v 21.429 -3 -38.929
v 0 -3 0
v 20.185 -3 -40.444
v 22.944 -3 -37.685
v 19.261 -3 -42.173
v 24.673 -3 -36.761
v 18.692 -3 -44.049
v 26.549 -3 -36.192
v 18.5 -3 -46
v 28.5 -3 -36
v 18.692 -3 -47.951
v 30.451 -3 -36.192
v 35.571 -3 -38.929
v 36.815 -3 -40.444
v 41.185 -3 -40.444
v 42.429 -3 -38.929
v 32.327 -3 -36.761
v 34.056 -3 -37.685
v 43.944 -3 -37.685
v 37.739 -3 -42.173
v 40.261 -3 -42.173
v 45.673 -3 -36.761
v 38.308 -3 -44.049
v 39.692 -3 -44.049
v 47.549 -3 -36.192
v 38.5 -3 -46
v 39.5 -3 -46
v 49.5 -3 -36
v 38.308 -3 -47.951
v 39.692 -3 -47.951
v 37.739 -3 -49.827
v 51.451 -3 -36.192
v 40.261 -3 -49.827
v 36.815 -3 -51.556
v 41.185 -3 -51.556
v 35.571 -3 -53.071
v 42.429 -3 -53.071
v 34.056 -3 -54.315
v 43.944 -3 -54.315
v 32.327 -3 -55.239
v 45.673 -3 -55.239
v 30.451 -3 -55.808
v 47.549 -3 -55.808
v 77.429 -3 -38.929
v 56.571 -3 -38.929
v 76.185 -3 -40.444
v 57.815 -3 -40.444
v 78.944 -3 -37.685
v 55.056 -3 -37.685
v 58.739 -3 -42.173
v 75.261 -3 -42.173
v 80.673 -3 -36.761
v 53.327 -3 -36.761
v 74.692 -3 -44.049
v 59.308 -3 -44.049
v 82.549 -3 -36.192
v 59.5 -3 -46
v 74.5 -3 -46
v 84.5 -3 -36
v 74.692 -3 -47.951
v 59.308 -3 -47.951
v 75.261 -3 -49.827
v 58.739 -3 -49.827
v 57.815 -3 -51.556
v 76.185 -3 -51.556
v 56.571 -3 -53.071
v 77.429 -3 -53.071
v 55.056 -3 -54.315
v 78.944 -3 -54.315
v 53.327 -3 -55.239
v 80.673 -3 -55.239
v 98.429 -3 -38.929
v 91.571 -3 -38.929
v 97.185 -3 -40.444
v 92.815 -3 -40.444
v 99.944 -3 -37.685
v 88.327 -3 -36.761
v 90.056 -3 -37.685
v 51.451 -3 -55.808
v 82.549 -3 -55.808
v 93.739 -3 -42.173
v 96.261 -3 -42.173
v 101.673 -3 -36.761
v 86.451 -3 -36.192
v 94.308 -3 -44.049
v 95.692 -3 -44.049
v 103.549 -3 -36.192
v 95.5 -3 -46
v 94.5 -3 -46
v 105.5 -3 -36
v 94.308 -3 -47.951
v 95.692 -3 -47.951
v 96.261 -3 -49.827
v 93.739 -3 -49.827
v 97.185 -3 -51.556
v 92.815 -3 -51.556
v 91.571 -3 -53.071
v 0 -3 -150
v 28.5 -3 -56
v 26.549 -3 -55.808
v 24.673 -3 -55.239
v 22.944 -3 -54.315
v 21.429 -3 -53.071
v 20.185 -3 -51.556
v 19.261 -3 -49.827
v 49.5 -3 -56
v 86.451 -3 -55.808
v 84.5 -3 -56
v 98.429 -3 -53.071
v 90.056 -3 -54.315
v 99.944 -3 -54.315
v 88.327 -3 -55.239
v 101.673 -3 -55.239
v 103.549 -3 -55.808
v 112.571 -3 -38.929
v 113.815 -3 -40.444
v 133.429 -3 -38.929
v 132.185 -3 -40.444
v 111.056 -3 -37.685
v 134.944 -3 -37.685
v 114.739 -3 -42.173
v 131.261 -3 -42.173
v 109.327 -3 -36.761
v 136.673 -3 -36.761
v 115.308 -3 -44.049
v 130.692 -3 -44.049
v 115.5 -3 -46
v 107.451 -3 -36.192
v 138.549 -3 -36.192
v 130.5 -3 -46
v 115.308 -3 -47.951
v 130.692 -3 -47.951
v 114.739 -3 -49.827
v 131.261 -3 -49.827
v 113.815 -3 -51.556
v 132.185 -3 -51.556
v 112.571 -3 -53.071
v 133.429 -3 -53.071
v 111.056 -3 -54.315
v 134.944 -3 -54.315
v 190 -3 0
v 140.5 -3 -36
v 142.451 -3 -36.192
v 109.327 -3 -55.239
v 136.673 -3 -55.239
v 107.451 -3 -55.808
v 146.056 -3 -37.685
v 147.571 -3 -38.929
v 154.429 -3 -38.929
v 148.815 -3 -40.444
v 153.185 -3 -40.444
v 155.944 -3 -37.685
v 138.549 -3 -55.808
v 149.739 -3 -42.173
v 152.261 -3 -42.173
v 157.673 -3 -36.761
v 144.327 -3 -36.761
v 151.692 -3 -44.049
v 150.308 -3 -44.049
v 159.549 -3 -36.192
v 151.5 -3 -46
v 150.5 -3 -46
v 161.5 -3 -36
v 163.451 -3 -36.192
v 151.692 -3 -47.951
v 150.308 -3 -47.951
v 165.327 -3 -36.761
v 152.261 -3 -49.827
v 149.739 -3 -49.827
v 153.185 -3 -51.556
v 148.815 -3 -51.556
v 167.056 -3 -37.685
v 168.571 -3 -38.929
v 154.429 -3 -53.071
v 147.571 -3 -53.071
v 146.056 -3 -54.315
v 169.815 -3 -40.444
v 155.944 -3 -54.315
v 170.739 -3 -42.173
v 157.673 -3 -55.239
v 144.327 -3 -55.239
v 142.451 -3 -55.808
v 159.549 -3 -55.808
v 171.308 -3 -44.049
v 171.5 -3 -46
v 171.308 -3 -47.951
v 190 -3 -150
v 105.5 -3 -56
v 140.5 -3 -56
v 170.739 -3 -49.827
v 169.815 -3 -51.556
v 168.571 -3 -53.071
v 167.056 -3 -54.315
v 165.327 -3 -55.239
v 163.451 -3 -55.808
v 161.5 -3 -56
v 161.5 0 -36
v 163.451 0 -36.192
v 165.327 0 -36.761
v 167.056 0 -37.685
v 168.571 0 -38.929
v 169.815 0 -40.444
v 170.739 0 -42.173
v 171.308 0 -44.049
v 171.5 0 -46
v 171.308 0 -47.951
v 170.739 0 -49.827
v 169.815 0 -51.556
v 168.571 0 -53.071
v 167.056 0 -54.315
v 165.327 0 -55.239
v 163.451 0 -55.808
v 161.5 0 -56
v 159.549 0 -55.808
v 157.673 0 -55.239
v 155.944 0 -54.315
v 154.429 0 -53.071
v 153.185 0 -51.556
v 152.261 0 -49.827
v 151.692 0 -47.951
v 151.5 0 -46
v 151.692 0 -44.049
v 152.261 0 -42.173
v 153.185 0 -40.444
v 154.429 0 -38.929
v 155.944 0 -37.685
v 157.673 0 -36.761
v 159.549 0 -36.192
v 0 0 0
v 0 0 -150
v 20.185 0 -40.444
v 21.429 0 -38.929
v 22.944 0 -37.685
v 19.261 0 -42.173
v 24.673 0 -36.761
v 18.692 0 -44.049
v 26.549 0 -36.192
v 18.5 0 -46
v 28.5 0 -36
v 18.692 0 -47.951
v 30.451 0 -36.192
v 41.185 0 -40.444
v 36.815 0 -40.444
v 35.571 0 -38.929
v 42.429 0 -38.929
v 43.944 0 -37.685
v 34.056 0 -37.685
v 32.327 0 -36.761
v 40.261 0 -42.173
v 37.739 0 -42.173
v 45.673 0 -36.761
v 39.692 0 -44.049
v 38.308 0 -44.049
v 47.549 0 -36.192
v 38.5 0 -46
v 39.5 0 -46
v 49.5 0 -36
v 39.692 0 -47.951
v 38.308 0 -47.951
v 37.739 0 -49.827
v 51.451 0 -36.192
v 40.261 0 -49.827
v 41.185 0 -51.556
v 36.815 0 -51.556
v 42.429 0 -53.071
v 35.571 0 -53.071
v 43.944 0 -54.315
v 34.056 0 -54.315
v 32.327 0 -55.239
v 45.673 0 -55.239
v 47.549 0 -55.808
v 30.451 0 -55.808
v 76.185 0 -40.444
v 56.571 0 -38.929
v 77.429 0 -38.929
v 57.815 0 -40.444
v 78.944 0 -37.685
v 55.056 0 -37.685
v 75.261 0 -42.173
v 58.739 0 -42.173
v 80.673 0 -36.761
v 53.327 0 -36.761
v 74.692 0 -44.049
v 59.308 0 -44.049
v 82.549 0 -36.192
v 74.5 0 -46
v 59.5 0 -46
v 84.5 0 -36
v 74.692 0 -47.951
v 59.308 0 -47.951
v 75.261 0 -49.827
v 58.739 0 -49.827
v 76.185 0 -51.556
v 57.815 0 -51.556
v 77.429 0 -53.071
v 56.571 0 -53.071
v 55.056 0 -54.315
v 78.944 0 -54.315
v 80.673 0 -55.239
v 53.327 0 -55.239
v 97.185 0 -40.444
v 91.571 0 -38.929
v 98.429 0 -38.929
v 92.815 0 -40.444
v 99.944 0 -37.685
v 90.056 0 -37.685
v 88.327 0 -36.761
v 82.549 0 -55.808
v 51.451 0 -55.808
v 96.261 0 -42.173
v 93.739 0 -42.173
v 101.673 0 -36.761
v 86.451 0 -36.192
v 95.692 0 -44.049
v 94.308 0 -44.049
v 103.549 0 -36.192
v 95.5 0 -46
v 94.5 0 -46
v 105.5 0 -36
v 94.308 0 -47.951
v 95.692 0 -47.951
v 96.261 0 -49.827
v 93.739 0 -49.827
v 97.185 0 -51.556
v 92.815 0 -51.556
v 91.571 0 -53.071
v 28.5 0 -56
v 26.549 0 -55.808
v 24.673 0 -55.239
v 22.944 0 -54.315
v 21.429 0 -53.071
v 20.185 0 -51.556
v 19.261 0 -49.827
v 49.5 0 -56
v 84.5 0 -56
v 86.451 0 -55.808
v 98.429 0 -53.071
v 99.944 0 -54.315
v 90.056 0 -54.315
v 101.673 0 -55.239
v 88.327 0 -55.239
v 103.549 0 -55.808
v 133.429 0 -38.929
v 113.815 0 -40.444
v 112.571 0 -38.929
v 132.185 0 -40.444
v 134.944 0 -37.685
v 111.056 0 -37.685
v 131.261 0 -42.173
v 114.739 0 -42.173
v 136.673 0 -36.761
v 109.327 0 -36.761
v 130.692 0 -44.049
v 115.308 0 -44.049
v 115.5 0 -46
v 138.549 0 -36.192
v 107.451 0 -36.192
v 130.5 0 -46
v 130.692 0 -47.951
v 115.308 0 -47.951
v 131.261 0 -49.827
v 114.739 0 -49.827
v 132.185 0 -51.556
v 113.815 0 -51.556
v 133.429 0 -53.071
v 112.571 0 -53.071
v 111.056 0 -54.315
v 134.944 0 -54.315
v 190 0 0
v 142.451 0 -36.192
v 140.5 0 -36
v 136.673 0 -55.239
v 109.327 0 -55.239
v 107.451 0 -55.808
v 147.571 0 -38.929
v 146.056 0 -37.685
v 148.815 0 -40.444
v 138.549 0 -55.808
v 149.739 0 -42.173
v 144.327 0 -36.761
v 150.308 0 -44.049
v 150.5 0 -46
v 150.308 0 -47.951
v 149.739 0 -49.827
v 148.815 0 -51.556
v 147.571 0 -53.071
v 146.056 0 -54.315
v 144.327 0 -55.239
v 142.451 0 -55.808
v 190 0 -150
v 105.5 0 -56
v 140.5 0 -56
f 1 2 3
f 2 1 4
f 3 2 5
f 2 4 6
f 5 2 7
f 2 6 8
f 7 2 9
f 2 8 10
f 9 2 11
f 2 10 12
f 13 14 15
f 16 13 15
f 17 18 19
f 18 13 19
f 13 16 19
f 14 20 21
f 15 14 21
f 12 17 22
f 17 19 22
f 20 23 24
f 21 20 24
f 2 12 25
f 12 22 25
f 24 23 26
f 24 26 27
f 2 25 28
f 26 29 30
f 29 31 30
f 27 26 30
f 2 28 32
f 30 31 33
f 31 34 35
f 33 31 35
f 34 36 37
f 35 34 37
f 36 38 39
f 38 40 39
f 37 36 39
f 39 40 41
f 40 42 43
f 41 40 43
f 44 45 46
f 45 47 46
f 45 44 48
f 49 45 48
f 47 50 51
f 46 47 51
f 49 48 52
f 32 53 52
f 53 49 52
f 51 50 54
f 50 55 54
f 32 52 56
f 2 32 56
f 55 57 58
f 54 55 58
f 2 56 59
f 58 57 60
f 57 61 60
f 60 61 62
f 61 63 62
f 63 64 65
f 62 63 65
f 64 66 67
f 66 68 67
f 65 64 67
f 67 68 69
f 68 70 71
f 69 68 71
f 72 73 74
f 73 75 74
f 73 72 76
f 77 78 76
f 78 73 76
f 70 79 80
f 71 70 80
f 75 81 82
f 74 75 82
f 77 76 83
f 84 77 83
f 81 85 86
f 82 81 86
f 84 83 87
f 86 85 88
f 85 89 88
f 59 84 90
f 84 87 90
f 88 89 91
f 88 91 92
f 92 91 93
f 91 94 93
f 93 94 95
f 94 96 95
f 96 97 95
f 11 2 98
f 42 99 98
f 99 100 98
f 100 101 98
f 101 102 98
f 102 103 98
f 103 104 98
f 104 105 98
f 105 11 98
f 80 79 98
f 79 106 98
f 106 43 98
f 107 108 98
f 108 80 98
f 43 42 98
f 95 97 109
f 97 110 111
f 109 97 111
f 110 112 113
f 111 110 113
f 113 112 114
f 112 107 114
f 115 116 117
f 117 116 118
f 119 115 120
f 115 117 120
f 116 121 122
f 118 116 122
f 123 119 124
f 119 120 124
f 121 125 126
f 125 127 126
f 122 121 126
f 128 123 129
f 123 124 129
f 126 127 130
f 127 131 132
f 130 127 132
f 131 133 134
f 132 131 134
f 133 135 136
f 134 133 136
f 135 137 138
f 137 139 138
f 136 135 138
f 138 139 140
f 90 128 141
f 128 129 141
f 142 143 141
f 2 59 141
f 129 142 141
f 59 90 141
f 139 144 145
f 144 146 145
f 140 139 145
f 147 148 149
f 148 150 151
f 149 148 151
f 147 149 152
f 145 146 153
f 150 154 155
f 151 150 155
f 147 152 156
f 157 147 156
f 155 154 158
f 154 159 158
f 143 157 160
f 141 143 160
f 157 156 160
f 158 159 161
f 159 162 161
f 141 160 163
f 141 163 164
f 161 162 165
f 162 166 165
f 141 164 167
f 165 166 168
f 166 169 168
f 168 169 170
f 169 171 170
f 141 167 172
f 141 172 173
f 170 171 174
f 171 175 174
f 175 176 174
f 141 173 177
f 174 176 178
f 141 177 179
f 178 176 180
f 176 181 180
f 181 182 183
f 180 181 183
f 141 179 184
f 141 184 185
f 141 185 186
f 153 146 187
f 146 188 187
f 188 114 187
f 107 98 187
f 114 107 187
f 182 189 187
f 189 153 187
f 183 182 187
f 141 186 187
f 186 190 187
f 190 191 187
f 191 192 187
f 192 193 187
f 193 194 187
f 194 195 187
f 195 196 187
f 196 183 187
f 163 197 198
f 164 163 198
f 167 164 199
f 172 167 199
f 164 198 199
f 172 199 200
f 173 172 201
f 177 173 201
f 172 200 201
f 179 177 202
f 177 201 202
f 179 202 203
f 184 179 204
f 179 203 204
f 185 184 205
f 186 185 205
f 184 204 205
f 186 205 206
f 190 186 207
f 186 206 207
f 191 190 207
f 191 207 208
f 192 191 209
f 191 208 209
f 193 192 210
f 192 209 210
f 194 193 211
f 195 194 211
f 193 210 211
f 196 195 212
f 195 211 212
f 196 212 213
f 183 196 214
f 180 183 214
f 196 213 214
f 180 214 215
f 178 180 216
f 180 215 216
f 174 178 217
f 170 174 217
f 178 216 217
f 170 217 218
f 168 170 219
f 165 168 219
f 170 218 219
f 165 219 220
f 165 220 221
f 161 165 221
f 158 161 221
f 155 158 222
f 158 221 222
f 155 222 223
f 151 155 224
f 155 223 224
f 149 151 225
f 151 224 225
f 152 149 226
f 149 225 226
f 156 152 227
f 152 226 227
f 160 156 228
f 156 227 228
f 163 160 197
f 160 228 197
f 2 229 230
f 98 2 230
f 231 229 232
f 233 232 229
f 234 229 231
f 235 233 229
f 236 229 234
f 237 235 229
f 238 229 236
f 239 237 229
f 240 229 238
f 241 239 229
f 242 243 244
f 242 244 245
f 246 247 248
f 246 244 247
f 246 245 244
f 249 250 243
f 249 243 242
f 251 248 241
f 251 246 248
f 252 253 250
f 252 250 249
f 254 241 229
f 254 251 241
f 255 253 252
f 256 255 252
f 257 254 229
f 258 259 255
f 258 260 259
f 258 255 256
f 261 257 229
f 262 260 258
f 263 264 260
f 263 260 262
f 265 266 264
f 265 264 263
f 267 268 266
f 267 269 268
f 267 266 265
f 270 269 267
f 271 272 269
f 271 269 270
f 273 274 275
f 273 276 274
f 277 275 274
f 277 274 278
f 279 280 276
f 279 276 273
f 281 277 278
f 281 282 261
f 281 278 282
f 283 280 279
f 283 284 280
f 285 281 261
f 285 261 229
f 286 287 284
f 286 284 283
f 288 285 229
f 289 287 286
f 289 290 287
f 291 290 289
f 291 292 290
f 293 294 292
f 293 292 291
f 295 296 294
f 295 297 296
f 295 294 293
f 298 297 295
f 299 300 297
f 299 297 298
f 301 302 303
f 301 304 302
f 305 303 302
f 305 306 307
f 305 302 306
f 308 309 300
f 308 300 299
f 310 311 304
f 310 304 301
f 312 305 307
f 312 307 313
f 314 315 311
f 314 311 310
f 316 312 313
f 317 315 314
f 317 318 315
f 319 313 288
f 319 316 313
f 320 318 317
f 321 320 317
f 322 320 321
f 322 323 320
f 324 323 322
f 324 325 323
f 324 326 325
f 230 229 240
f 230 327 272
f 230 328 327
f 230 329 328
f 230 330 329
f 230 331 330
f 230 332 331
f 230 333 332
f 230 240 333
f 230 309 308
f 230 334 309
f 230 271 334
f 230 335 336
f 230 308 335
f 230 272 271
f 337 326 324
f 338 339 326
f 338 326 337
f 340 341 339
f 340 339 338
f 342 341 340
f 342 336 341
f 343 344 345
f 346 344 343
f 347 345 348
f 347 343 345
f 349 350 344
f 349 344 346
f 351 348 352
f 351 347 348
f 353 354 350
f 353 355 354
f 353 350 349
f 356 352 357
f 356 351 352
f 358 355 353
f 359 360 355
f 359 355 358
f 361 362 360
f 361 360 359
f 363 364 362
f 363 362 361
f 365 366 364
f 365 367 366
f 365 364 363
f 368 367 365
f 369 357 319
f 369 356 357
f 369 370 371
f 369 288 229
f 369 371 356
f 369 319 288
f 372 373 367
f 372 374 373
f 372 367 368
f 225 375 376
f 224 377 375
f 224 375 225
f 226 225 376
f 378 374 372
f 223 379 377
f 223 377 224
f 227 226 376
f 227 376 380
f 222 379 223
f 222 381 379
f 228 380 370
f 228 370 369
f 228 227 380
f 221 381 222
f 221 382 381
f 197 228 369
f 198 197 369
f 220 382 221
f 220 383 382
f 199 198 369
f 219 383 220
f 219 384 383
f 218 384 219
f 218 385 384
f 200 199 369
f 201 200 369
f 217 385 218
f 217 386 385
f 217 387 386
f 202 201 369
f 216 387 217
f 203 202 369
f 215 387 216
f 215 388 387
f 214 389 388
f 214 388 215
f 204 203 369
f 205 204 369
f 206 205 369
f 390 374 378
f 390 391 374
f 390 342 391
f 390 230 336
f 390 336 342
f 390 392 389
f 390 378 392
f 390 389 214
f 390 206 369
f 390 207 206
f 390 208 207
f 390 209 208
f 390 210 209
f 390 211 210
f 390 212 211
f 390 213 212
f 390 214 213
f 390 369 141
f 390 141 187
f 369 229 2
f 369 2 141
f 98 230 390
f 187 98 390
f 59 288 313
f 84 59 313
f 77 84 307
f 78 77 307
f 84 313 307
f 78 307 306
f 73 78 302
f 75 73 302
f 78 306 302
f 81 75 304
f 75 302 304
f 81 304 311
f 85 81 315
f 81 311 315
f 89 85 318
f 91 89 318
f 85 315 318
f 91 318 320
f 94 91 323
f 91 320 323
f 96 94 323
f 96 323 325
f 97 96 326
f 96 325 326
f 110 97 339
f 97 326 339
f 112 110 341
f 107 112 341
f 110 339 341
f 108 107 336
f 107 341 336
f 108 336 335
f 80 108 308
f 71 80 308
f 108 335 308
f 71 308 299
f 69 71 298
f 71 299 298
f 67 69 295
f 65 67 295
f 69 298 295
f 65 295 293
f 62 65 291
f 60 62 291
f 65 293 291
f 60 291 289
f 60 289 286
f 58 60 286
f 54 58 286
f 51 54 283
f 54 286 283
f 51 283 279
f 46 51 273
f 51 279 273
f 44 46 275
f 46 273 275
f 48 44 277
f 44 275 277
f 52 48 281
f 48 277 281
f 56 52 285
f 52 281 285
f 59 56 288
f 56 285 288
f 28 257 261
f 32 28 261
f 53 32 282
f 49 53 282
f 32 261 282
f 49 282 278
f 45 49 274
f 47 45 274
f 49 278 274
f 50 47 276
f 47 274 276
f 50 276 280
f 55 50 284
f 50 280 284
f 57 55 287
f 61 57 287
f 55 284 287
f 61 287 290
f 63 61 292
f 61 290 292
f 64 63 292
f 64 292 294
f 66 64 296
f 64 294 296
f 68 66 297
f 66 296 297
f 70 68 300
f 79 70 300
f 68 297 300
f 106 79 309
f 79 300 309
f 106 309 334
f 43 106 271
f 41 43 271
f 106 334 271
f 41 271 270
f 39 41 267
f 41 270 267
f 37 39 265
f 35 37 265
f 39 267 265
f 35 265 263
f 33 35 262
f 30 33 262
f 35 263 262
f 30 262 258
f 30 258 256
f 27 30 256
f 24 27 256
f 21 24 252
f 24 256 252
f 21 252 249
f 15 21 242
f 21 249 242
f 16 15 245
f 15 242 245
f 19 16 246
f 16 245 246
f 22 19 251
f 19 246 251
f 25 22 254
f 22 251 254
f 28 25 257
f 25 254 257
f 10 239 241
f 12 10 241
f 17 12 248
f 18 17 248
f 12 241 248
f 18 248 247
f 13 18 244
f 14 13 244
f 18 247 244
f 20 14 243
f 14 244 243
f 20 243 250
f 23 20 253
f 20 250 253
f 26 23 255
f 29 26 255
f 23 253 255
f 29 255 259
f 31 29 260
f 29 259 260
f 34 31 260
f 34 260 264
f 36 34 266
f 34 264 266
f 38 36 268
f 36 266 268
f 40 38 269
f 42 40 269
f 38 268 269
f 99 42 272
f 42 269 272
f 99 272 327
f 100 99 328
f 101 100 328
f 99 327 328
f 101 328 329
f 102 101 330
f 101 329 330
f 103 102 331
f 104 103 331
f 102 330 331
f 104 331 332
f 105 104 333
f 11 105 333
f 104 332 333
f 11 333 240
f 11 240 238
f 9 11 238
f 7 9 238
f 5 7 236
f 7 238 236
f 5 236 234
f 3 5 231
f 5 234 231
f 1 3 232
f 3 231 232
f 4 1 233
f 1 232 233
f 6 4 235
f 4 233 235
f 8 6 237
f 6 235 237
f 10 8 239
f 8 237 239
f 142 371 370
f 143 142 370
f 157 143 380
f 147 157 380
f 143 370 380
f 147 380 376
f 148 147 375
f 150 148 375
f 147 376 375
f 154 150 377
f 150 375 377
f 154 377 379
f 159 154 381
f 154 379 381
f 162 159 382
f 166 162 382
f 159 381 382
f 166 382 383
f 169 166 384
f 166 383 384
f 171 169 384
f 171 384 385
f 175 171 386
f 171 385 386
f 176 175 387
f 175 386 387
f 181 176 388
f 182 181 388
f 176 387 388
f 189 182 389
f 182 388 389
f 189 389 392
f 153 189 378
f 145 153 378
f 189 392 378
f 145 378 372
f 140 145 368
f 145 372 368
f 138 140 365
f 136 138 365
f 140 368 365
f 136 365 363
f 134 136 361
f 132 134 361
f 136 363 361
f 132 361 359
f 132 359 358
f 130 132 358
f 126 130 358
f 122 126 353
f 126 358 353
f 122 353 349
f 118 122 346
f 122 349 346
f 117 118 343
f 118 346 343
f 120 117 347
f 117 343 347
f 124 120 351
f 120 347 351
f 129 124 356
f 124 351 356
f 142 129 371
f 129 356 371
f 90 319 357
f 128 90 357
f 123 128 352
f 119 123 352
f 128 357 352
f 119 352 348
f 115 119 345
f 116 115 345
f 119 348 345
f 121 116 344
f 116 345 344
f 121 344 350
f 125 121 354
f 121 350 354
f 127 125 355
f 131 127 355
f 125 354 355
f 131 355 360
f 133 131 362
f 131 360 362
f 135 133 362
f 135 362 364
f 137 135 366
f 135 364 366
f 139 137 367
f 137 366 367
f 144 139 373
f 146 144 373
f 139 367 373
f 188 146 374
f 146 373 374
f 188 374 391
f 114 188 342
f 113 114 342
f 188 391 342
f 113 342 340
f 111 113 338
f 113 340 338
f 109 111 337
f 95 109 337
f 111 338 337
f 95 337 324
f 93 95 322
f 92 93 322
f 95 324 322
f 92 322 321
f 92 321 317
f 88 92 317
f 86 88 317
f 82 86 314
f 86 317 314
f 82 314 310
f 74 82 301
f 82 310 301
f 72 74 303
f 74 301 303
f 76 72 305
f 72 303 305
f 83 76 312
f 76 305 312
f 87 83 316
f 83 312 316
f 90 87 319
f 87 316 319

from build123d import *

# Parameters (mm, degrees)
SKETCH1_W          = 190
SKETCH1_H          = 150
SKETCH1_R          = 10
BASE_FLANGE1_DEPTH = 3


# Sheet-metal steps are written as plain solids
with BuildPart() as part:
    # Sketch1 → Base-Flange1 (new body)
    with BuildSketch(Plane(origin=(0, 0, 0), x_dir=(1, 0, 0), z_dir=(0, 1, 0))):
        with Locations((95, 75)):
            Rectangle(SKETCH1_W, SKETCH1_H)
        with Locations(Location((28.5, 46, 0), (0, 0, 270))):
            Circle(SKETCH1_R, mode=Mode.SUBTRACT)
        with Locations(Location((49.5, 46, 0), (0, 0, 270))):
            Circle(SKETCH1_R, mode=Mode.SUBTRACT)
        with Locations(Location((84.5, 46, 0), (0, 0, 270))):
            Circle(SKETCH1_R, mode=Mode.SUBTRACT)
        with Locations(Location((105.5, 46, 0), (0, 0, 270))):
            Circle(SKETCH1_R, mode=Mode.SUBTRACT)
        with Locations(Location((140.5, 46, 0), (0, 0, 270))):
            Circle(SKETCH1_R, mode=Mode.SUBTRACT)
        with Locations(Location((161.5, 46, 0), (0, 0, 270))):
            Circle(SKETCH1_R, mode=Mode.SUBTRACT)
    extrude(amount=-BASE_FLANGE1_DEPTH)


solid = part.part
